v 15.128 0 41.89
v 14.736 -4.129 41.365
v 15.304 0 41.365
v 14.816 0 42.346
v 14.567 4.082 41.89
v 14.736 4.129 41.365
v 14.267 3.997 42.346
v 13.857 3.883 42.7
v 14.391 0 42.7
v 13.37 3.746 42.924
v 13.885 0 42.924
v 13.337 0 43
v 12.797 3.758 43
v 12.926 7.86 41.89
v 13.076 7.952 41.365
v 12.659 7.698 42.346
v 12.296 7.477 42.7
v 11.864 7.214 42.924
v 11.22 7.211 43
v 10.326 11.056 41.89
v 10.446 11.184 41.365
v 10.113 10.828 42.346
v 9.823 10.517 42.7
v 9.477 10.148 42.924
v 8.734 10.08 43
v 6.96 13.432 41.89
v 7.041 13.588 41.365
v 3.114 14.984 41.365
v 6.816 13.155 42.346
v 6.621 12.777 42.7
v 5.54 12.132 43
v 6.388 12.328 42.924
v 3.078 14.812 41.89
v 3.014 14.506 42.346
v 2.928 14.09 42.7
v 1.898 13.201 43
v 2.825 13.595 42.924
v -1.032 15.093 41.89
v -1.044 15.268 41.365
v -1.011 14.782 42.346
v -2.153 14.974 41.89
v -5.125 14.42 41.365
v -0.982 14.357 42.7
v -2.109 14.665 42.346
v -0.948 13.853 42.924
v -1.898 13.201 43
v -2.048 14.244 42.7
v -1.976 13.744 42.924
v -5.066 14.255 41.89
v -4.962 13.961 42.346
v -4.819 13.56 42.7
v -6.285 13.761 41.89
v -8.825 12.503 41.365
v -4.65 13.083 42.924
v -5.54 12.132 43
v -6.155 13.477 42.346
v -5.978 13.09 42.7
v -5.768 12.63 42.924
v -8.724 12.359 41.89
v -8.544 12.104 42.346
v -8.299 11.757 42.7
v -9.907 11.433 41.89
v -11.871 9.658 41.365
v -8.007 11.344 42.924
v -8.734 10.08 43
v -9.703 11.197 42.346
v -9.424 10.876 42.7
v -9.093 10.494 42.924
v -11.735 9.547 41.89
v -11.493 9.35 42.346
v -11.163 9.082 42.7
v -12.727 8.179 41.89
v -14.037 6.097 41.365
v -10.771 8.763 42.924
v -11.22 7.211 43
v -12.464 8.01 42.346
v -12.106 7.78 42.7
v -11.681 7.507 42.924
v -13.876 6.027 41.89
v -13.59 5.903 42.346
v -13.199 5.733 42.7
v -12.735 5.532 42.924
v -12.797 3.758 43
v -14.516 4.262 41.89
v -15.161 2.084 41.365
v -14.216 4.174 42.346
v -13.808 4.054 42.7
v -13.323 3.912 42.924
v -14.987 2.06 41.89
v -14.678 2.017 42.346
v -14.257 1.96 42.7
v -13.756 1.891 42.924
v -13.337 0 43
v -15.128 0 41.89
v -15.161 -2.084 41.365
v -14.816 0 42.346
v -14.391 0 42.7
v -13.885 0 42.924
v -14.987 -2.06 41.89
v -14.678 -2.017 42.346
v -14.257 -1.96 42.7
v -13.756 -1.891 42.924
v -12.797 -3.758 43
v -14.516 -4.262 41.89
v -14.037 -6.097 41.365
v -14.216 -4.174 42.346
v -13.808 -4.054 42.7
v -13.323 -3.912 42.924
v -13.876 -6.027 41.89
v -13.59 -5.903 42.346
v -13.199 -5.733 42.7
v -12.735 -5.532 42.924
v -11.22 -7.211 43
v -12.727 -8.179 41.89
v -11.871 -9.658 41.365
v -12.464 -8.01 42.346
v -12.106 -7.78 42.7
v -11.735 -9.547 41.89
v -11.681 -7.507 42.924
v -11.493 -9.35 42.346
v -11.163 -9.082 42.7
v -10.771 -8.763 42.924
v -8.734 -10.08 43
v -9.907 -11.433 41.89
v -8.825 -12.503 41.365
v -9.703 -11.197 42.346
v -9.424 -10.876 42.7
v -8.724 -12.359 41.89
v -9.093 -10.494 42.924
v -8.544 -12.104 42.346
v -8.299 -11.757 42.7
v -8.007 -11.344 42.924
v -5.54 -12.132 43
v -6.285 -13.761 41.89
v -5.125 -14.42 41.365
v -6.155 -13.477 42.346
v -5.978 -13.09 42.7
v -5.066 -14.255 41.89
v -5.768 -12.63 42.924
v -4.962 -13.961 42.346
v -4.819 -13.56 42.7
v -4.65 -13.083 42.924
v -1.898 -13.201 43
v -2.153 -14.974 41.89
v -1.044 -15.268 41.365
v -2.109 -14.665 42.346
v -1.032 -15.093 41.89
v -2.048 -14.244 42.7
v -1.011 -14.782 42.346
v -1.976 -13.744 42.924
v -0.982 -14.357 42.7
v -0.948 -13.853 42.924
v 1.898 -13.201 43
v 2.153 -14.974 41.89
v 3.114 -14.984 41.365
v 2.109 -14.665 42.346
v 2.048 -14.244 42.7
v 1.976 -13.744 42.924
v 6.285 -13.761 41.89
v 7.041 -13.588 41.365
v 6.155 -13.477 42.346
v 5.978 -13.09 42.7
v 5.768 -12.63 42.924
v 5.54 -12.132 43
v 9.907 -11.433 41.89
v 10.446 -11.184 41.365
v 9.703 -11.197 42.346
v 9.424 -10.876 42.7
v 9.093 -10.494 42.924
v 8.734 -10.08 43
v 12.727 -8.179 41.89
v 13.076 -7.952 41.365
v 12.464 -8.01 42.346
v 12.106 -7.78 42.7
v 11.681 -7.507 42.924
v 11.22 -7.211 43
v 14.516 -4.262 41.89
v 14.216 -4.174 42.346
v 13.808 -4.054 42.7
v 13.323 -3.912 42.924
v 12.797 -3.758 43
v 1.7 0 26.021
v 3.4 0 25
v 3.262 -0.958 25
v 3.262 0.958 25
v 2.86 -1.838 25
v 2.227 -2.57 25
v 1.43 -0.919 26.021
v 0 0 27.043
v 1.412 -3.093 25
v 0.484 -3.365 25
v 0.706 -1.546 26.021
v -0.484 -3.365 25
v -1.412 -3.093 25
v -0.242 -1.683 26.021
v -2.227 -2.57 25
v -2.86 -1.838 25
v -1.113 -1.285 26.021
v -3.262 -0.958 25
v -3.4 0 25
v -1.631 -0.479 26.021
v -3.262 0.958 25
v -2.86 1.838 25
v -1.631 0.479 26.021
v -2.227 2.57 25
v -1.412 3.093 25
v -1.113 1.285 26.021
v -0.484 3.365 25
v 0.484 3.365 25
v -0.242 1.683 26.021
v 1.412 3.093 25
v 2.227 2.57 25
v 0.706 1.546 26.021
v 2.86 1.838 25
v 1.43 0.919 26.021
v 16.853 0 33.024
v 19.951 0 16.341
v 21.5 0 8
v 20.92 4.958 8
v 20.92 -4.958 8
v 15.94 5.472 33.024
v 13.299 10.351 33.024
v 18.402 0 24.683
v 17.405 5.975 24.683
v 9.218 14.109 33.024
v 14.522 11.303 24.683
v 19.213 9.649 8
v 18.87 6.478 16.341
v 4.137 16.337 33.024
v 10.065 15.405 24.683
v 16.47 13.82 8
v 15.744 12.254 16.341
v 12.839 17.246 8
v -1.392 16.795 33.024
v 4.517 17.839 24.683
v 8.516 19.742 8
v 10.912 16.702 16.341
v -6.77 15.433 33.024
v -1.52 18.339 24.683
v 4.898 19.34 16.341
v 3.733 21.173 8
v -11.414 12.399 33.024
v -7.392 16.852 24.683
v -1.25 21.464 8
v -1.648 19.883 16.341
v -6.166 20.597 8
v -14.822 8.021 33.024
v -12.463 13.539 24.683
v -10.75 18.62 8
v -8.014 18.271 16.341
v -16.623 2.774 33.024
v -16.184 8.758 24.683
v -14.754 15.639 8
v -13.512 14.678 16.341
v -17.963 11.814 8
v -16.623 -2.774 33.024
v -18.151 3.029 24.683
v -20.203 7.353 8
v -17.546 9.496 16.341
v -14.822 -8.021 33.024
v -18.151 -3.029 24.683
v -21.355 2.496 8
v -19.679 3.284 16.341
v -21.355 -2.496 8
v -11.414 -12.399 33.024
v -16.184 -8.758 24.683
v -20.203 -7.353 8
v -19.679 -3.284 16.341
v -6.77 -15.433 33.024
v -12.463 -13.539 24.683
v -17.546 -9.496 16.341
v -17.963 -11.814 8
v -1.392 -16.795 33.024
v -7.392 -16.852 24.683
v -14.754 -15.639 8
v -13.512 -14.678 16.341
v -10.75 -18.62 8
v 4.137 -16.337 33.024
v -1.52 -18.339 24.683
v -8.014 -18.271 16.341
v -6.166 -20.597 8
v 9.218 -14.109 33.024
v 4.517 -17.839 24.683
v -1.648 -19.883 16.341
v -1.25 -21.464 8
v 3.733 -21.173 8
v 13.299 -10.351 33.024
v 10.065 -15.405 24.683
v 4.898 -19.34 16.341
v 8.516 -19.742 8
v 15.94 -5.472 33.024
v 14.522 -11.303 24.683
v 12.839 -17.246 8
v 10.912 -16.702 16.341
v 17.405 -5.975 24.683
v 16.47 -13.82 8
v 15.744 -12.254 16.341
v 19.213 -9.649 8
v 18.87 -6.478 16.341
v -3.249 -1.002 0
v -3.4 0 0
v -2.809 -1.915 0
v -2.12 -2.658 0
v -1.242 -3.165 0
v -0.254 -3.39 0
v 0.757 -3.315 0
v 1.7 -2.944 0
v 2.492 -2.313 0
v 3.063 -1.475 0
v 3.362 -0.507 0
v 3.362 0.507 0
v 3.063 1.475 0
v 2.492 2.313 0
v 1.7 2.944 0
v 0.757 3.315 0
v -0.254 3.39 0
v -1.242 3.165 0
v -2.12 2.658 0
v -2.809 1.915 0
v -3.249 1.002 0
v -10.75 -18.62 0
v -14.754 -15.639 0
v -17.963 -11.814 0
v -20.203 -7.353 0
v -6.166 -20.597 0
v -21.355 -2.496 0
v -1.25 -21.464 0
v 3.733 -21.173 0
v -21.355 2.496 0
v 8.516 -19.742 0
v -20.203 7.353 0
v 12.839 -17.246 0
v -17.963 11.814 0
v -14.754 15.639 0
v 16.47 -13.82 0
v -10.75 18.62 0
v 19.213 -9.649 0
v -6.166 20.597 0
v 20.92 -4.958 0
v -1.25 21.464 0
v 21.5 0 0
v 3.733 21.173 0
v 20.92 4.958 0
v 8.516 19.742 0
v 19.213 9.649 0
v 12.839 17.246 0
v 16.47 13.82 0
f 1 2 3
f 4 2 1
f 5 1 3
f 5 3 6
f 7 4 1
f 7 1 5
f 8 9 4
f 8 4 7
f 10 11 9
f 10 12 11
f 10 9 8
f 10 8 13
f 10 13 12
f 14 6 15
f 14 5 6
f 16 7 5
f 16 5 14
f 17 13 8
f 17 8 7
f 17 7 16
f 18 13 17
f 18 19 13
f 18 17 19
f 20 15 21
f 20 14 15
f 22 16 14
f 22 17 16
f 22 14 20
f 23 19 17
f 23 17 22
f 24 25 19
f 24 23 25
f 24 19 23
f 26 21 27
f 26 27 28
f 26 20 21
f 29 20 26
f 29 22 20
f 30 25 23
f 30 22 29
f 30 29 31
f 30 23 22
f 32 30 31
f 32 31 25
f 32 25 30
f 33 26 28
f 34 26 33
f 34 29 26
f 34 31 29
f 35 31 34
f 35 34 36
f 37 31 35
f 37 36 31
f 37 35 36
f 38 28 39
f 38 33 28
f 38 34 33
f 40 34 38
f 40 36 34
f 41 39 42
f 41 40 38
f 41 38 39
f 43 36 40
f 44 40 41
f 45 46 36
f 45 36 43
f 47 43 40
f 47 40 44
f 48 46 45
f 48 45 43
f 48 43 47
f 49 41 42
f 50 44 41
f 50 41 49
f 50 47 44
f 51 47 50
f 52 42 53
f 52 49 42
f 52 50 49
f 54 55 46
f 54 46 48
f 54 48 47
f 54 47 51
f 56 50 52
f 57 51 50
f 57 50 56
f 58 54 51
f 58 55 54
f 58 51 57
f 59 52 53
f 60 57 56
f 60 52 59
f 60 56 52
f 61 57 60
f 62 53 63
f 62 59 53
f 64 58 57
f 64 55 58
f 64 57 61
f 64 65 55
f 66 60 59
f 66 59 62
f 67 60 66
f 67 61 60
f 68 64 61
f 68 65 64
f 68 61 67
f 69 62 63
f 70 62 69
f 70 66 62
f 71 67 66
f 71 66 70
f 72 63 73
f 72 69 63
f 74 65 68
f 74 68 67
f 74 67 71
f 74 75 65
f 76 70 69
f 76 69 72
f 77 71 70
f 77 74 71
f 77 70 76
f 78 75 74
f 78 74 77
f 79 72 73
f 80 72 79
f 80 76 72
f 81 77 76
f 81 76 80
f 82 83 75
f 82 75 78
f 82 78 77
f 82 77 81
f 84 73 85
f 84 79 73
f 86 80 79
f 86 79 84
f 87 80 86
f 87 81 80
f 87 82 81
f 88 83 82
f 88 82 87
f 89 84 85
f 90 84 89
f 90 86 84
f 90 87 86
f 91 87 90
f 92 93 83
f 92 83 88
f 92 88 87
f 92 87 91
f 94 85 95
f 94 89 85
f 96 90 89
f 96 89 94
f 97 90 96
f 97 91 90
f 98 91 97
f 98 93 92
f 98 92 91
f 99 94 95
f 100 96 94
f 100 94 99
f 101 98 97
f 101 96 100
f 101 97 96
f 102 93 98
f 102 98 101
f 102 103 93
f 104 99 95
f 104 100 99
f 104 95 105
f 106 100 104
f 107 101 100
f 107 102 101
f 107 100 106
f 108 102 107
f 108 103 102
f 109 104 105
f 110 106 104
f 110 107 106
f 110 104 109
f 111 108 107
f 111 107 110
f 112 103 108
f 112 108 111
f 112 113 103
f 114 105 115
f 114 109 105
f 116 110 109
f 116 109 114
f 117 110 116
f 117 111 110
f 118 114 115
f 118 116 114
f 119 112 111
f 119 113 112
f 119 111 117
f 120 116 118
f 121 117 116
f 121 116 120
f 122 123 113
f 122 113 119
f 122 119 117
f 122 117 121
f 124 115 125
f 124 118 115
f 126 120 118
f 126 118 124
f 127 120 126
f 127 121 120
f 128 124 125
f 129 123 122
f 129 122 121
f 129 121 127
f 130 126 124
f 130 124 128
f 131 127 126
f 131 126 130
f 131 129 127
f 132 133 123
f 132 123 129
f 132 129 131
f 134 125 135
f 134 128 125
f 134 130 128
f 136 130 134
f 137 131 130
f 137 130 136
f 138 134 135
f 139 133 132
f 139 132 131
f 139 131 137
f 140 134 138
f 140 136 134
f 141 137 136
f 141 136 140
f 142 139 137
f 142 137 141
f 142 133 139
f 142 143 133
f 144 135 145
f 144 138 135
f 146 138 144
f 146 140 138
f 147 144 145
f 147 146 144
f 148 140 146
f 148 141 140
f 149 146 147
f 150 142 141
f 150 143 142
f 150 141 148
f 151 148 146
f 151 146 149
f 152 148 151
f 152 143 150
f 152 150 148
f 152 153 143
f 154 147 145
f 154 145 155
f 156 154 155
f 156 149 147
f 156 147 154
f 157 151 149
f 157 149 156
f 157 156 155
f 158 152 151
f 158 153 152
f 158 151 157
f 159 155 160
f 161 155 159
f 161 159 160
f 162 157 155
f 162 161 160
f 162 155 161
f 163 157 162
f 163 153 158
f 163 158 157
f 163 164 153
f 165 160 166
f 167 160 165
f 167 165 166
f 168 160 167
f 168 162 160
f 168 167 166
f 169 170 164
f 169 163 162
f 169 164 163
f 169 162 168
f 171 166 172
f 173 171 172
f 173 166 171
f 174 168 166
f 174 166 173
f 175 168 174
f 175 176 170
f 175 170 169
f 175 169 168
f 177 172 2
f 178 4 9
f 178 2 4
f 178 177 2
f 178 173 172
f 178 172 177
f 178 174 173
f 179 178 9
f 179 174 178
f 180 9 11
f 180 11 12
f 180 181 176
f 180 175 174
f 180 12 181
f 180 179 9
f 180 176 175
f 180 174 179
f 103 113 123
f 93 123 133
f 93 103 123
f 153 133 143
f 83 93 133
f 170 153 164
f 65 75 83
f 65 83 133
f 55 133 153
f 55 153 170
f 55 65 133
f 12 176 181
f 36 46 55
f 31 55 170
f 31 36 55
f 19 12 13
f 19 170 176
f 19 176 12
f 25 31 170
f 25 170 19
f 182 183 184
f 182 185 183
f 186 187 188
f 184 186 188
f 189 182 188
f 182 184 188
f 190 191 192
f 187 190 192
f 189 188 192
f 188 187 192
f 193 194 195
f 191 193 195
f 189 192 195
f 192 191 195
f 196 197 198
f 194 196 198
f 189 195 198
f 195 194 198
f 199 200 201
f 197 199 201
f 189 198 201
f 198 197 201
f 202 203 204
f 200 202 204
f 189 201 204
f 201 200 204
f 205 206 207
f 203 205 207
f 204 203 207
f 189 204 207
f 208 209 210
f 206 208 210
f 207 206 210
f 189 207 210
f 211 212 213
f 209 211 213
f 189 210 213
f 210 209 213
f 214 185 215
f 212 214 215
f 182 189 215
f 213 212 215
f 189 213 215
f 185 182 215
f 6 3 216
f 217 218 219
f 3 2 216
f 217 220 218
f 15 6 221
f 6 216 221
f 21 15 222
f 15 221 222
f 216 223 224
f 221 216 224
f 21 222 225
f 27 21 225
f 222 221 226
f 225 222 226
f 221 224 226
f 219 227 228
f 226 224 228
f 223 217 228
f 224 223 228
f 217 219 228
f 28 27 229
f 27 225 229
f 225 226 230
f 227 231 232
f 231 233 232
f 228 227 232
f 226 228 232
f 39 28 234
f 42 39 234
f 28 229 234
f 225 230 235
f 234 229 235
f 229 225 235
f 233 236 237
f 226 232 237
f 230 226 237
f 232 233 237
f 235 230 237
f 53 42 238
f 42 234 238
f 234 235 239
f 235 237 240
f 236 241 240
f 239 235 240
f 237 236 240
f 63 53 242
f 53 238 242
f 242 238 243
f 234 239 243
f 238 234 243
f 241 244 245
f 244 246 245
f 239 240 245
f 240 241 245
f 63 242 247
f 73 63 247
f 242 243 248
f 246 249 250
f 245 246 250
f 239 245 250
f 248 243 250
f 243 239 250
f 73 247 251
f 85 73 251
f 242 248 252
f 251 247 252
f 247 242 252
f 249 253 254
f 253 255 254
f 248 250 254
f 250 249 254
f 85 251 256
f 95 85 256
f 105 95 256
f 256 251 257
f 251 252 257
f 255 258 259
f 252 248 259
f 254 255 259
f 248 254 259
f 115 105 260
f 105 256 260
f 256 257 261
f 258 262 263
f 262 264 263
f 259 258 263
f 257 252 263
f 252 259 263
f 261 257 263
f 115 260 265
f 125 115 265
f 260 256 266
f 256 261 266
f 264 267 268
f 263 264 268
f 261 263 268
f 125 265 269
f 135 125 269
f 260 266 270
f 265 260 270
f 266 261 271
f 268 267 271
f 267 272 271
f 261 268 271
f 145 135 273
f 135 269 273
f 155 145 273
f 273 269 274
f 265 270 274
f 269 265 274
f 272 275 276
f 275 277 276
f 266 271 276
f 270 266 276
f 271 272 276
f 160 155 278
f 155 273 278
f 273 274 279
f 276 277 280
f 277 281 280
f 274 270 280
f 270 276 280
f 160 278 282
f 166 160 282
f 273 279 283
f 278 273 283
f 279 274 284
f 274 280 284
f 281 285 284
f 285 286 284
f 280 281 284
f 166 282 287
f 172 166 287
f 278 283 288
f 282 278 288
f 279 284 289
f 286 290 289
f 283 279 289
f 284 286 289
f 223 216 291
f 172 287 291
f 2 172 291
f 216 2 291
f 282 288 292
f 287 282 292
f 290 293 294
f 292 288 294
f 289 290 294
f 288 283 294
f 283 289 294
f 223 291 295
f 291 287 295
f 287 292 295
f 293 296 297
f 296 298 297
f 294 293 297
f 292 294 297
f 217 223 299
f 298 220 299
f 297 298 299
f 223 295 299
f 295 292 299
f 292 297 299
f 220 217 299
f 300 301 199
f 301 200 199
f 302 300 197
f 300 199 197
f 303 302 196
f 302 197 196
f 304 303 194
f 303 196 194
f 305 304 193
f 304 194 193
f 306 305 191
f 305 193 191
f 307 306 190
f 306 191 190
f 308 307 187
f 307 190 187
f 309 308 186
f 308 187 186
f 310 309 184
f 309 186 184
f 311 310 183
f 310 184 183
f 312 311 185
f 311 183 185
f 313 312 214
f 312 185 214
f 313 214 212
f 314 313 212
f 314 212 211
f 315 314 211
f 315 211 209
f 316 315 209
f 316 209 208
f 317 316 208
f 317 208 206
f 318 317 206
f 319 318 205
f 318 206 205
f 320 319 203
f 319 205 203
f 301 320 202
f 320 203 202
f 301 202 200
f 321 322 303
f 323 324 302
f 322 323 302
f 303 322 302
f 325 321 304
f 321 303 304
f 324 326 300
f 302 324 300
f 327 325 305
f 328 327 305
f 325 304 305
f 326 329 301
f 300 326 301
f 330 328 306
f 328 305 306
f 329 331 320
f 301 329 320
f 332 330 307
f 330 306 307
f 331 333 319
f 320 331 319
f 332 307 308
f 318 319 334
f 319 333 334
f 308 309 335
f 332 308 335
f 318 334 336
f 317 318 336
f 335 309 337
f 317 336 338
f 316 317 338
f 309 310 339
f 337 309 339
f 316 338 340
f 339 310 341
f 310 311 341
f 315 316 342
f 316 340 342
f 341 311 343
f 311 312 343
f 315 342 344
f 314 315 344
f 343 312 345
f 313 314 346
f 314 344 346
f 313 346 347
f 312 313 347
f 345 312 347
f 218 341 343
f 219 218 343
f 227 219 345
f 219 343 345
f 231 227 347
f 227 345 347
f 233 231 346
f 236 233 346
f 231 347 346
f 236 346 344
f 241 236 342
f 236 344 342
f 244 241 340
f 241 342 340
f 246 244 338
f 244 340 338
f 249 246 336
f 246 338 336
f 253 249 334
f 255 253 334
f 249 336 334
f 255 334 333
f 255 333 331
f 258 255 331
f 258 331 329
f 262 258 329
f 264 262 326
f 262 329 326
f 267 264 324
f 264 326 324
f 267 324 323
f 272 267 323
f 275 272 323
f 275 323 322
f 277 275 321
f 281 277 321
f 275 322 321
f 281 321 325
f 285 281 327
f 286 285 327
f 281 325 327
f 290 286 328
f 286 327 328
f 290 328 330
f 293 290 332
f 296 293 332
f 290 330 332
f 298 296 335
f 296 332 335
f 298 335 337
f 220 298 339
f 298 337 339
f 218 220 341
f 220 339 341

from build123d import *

# Parameters (mm, degrees)
F0_R      = 21.5
F1_DEPTH  = 8
F3_R      = 15
F1_FACE_R = 21.5
F6_D      = 6.8
F6_DEPTH  = 25
F6_TIP    = 2.0429261047
F7_R      = 2


with BuildPart() as f1:
    # F0 (on Top) → F1 (new body)
    with BuildSketch(Plane.XY):
        Circle(F0_R)
    extrude(amount=F1_DEPTH)

    # F3 (on offset) → F4 section 0
    with BuildSketch(Plane.XY.offset(43)):
        Circle(F3_R)
    # F1_face (on face) → F4 section 1
    with BuildSketch(Plane.XY.offset(8)):
        Circle(F1_FACE_R)
    loft()

    # F6
    with Locations(Plane(origin=(0, 0, 0), x_dir=(1, 0, 0), z_dir=(0, 0, -1))):
        with Locations((0, 0)):
            Hole(F6_D / 2, depth=F6_DEPTH)
            with Locations((0, 0, -(F6_DEPTH + F6_TIP / 2))):  # 118° drill point
                Cone(0, F6_D / 2, F6_TIP, mode=Mode.SUBTRACT)

    # F7
    f7_edges = [f1.edges().sort_by_distance(p)[0] for p in [
        (-15, 0, 43),
    ]]
    fillet(f7_edges, radius=F7_R)


solid = f1.part
